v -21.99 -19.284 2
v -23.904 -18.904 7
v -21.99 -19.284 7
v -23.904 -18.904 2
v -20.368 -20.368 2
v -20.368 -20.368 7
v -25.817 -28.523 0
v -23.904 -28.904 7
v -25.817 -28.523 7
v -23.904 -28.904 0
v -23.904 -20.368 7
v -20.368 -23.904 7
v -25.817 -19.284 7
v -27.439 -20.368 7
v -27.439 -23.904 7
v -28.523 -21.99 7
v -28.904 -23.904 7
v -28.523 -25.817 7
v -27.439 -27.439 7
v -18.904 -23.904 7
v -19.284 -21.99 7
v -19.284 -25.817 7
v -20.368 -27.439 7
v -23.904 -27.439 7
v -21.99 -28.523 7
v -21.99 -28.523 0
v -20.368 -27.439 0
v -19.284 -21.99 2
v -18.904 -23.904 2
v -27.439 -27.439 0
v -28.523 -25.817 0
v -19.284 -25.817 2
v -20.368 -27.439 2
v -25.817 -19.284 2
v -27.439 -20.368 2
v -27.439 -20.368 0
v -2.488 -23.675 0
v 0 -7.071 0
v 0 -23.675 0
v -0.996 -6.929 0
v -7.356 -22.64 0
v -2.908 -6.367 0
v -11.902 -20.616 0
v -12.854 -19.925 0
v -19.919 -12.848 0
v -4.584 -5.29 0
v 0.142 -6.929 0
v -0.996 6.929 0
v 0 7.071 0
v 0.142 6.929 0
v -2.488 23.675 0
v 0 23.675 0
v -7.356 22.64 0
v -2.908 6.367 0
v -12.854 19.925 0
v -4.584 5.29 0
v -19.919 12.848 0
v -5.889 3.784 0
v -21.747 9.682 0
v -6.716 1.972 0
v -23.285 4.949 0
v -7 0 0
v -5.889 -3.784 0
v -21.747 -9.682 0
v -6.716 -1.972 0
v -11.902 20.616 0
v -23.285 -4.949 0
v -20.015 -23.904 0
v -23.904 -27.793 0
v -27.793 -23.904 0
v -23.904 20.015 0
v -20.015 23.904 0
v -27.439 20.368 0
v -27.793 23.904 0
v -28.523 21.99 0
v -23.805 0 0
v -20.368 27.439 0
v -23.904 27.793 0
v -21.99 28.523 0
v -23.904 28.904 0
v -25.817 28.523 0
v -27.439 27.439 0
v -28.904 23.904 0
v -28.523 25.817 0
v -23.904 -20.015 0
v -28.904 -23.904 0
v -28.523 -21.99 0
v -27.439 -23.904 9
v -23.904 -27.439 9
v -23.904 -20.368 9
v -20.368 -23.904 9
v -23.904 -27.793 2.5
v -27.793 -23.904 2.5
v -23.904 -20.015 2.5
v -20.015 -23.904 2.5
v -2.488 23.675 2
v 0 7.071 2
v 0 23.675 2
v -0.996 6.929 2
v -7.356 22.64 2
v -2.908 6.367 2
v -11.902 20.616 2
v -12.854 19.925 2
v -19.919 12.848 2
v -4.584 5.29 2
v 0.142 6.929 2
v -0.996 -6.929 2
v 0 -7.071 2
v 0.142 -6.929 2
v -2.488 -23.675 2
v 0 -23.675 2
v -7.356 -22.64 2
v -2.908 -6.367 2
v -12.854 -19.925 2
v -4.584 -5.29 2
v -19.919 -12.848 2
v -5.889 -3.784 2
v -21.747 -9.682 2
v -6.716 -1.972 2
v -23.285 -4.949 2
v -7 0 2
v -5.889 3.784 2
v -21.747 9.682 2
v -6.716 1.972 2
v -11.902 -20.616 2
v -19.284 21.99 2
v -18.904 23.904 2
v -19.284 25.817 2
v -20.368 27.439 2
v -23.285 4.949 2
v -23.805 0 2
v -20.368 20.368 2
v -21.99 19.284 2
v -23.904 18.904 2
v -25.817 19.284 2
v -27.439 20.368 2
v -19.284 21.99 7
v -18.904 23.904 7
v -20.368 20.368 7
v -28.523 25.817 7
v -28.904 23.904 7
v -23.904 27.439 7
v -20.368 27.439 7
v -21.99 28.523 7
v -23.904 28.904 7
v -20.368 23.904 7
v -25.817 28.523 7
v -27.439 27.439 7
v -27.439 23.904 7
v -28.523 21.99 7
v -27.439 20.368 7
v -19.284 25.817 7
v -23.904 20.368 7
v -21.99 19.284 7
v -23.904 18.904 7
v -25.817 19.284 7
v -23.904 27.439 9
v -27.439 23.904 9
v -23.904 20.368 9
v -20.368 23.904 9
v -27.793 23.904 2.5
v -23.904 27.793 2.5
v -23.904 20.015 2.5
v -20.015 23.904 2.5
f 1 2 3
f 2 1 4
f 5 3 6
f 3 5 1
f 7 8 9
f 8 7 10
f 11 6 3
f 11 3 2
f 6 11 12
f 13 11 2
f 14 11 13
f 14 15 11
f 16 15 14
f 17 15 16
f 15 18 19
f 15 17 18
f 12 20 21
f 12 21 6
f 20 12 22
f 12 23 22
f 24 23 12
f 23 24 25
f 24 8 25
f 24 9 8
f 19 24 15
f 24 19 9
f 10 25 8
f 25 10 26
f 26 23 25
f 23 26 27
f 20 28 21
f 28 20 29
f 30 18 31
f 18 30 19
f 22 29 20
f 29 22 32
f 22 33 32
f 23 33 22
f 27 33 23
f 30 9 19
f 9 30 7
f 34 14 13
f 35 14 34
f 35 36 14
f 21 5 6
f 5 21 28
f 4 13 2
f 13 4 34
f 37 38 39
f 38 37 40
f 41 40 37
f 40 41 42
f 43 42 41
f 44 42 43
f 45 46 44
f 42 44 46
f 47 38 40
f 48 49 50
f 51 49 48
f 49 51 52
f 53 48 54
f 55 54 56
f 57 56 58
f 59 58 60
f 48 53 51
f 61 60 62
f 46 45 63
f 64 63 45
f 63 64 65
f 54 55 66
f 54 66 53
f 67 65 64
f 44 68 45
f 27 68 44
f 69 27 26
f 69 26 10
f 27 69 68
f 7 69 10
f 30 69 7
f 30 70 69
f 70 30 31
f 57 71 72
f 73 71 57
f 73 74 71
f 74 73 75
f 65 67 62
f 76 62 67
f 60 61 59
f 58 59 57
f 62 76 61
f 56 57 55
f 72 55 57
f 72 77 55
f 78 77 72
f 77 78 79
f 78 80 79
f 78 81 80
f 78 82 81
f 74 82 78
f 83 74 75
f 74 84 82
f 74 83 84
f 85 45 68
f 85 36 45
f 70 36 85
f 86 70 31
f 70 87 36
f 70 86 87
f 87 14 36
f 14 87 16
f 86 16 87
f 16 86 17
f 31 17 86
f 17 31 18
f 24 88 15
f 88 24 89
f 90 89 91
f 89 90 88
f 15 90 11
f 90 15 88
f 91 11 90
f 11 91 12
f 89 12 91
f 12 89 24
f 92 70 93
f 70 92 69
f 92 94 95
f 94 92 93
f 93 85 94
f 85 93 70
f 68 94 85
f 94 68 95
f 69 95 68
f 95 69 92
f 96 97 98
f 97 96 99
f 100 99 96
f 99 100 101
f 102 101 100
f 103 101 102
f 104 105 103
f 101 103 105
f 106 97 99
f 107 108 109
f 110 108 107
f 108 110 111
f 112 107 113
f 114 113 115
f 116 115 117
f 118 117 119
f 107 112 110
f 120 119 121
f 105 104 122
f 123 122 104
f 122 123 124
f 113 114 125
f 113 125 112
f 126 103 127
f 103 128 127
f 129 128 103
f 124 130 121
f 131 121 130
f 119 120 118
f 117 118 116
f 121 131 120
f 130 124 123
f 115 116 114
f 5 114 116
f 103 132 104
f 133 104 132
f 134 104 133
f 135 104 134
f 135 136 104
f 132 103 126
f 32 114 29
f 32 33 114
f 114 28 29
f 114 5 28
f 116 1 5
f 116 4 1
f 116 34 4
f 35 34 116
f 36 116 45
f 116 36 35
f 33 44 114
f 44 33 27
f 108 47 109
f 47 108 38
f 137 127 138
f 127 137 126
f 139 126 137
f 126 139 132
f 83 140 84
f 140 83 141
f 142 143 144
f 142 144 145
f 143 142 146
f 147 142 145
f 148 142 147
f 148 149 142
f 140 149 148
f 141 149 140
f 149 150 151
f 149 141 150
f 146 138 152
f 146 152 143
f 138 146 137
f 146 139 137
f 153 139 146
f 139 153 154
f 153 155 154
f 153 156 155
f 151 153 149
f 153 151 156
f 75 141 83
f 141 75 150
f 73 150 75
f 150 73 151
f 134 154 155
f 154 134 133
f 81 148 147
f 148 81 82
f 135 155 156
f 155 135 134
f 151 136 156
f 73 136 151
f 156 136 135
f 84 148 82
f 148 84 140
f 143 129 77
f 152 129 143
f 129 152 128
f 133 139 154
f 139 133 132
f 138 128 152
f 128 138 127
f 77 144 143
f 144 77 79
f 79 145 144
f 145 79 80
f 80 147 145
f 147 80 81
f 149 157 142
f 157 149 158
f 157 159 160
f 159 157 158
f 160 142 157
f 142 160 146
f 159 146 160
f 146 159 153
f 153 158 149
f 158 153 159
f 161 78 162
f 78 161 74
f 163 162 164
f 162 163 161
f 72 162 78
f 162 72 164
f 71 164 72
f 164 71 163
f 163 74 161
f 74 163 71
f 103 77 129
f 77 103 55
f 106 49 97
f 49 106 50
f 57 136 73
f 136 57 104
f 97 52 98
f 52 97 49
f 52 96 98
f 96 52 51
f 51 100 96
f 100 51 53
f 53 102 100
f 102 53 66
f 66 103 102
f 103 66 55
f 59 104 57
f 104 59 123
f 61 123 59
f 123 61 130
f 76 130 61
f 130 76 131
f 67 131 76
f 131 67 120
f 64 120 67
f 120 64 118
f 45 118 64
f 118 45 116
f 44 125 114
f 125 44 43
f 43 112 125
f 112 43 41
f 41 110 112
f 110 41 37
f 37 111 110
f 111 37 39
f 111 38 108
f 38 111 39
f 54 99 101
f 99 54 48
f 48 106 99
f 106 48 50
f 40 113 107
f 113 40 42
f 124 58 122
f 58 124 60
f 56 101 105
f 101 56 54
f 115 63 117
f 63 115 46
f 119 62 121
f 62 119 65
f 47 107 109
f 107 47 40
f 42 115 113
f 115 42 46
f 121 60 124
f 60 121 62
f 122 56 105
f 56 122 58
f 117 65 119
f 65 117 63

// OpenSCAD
// file: varicap.scad
capacitance = 400; // pF
num_plates = 11;
plate_gap = 5;
plate_thickness = 2;

strut_r = 5;
handle_length = 25;
leg_length = 10;
leg_separation_angle=90;

fit_gap = 0.5;
slip_gap = 1;

num_stators = floor(num_plates/2);
num_rotors = ceil(num_plates/2);
leg_angle_0 = leg_separation_angle/2;
leg_angle_1 = 360 - leg_separation_angle/2;
r = sqrt((2*plate_gap*capacitance) / ((num_plates-1)*0.2248*3.14));
//TODO: account for space missing in the centre of the plates

module semicircle () {
    difference() {
        circle(r);
        circle(strut_r-fit_gap);
        translate([r,0,0]) {
            square(2*r, true);
        }
    }
}

module washer() {
    difference() {
        circle(strut_r);
        circle(bolt_r);
    }
}

module spacer(end) {
    
    washer_len = plate_thickness + plate_gap - slip_gap/2;
    bearing_len = end ? plate_thickness*2 + plate_gap + slip_gap/2 : plate_thickness+plate_gap;
    
    difference () {
        union () {
            if (end) {
                linear_extrude (washer_len) {
                    circle (strut_r * 1.5);
                }
            }
            linear_extrude (bearing_len) {
                circle (strut_r);
            }
            translate ([0,0,bearing_len - fit_gap]) {
                linear_extrude(plate_thickness+fit_gap) {
                    square (strut_r, true);
                }
            }
        }
        
        translate ([0,0,-fit_gap]) {
            linear_extrude (plate_thickness + fit_gap*2) {
                square (strut_r+fit_gap, true);
            }
        }
    }
}
// main file
include <varicap.scad>

module leg() {
    union() {
        linear_extrude (plate_thickness) {
            difference (){
                hull() {
                    circle(strut_r);
                    translate([-(r+leg_length),0,0]) {
                        circle(strut_r);
                    }
                }
                translate([-(r+leg_length),0,0]) {
                    circle(strut_r-fit_gap);
                }
            }
        }
        translate ([-(r+leg_length),0,0]) {
            spacer ();
        }
    }
}

module stator () {
    difference () {
        union () {
            linear_extrude (plate_thickness) {
                semicircle ();
            }
            rotate ([0,0,leg_angle_0]) leg();
            rotate ([0,0,leg_angle_1]) leg();
        }
        translate ([0,0,-fit_gap]) {
            linear_extrude (plate_thickness + 2*fit_gap) {
                circle (strut_r + 2*slip_gap);
            }
        }
    }
}

stator ();
